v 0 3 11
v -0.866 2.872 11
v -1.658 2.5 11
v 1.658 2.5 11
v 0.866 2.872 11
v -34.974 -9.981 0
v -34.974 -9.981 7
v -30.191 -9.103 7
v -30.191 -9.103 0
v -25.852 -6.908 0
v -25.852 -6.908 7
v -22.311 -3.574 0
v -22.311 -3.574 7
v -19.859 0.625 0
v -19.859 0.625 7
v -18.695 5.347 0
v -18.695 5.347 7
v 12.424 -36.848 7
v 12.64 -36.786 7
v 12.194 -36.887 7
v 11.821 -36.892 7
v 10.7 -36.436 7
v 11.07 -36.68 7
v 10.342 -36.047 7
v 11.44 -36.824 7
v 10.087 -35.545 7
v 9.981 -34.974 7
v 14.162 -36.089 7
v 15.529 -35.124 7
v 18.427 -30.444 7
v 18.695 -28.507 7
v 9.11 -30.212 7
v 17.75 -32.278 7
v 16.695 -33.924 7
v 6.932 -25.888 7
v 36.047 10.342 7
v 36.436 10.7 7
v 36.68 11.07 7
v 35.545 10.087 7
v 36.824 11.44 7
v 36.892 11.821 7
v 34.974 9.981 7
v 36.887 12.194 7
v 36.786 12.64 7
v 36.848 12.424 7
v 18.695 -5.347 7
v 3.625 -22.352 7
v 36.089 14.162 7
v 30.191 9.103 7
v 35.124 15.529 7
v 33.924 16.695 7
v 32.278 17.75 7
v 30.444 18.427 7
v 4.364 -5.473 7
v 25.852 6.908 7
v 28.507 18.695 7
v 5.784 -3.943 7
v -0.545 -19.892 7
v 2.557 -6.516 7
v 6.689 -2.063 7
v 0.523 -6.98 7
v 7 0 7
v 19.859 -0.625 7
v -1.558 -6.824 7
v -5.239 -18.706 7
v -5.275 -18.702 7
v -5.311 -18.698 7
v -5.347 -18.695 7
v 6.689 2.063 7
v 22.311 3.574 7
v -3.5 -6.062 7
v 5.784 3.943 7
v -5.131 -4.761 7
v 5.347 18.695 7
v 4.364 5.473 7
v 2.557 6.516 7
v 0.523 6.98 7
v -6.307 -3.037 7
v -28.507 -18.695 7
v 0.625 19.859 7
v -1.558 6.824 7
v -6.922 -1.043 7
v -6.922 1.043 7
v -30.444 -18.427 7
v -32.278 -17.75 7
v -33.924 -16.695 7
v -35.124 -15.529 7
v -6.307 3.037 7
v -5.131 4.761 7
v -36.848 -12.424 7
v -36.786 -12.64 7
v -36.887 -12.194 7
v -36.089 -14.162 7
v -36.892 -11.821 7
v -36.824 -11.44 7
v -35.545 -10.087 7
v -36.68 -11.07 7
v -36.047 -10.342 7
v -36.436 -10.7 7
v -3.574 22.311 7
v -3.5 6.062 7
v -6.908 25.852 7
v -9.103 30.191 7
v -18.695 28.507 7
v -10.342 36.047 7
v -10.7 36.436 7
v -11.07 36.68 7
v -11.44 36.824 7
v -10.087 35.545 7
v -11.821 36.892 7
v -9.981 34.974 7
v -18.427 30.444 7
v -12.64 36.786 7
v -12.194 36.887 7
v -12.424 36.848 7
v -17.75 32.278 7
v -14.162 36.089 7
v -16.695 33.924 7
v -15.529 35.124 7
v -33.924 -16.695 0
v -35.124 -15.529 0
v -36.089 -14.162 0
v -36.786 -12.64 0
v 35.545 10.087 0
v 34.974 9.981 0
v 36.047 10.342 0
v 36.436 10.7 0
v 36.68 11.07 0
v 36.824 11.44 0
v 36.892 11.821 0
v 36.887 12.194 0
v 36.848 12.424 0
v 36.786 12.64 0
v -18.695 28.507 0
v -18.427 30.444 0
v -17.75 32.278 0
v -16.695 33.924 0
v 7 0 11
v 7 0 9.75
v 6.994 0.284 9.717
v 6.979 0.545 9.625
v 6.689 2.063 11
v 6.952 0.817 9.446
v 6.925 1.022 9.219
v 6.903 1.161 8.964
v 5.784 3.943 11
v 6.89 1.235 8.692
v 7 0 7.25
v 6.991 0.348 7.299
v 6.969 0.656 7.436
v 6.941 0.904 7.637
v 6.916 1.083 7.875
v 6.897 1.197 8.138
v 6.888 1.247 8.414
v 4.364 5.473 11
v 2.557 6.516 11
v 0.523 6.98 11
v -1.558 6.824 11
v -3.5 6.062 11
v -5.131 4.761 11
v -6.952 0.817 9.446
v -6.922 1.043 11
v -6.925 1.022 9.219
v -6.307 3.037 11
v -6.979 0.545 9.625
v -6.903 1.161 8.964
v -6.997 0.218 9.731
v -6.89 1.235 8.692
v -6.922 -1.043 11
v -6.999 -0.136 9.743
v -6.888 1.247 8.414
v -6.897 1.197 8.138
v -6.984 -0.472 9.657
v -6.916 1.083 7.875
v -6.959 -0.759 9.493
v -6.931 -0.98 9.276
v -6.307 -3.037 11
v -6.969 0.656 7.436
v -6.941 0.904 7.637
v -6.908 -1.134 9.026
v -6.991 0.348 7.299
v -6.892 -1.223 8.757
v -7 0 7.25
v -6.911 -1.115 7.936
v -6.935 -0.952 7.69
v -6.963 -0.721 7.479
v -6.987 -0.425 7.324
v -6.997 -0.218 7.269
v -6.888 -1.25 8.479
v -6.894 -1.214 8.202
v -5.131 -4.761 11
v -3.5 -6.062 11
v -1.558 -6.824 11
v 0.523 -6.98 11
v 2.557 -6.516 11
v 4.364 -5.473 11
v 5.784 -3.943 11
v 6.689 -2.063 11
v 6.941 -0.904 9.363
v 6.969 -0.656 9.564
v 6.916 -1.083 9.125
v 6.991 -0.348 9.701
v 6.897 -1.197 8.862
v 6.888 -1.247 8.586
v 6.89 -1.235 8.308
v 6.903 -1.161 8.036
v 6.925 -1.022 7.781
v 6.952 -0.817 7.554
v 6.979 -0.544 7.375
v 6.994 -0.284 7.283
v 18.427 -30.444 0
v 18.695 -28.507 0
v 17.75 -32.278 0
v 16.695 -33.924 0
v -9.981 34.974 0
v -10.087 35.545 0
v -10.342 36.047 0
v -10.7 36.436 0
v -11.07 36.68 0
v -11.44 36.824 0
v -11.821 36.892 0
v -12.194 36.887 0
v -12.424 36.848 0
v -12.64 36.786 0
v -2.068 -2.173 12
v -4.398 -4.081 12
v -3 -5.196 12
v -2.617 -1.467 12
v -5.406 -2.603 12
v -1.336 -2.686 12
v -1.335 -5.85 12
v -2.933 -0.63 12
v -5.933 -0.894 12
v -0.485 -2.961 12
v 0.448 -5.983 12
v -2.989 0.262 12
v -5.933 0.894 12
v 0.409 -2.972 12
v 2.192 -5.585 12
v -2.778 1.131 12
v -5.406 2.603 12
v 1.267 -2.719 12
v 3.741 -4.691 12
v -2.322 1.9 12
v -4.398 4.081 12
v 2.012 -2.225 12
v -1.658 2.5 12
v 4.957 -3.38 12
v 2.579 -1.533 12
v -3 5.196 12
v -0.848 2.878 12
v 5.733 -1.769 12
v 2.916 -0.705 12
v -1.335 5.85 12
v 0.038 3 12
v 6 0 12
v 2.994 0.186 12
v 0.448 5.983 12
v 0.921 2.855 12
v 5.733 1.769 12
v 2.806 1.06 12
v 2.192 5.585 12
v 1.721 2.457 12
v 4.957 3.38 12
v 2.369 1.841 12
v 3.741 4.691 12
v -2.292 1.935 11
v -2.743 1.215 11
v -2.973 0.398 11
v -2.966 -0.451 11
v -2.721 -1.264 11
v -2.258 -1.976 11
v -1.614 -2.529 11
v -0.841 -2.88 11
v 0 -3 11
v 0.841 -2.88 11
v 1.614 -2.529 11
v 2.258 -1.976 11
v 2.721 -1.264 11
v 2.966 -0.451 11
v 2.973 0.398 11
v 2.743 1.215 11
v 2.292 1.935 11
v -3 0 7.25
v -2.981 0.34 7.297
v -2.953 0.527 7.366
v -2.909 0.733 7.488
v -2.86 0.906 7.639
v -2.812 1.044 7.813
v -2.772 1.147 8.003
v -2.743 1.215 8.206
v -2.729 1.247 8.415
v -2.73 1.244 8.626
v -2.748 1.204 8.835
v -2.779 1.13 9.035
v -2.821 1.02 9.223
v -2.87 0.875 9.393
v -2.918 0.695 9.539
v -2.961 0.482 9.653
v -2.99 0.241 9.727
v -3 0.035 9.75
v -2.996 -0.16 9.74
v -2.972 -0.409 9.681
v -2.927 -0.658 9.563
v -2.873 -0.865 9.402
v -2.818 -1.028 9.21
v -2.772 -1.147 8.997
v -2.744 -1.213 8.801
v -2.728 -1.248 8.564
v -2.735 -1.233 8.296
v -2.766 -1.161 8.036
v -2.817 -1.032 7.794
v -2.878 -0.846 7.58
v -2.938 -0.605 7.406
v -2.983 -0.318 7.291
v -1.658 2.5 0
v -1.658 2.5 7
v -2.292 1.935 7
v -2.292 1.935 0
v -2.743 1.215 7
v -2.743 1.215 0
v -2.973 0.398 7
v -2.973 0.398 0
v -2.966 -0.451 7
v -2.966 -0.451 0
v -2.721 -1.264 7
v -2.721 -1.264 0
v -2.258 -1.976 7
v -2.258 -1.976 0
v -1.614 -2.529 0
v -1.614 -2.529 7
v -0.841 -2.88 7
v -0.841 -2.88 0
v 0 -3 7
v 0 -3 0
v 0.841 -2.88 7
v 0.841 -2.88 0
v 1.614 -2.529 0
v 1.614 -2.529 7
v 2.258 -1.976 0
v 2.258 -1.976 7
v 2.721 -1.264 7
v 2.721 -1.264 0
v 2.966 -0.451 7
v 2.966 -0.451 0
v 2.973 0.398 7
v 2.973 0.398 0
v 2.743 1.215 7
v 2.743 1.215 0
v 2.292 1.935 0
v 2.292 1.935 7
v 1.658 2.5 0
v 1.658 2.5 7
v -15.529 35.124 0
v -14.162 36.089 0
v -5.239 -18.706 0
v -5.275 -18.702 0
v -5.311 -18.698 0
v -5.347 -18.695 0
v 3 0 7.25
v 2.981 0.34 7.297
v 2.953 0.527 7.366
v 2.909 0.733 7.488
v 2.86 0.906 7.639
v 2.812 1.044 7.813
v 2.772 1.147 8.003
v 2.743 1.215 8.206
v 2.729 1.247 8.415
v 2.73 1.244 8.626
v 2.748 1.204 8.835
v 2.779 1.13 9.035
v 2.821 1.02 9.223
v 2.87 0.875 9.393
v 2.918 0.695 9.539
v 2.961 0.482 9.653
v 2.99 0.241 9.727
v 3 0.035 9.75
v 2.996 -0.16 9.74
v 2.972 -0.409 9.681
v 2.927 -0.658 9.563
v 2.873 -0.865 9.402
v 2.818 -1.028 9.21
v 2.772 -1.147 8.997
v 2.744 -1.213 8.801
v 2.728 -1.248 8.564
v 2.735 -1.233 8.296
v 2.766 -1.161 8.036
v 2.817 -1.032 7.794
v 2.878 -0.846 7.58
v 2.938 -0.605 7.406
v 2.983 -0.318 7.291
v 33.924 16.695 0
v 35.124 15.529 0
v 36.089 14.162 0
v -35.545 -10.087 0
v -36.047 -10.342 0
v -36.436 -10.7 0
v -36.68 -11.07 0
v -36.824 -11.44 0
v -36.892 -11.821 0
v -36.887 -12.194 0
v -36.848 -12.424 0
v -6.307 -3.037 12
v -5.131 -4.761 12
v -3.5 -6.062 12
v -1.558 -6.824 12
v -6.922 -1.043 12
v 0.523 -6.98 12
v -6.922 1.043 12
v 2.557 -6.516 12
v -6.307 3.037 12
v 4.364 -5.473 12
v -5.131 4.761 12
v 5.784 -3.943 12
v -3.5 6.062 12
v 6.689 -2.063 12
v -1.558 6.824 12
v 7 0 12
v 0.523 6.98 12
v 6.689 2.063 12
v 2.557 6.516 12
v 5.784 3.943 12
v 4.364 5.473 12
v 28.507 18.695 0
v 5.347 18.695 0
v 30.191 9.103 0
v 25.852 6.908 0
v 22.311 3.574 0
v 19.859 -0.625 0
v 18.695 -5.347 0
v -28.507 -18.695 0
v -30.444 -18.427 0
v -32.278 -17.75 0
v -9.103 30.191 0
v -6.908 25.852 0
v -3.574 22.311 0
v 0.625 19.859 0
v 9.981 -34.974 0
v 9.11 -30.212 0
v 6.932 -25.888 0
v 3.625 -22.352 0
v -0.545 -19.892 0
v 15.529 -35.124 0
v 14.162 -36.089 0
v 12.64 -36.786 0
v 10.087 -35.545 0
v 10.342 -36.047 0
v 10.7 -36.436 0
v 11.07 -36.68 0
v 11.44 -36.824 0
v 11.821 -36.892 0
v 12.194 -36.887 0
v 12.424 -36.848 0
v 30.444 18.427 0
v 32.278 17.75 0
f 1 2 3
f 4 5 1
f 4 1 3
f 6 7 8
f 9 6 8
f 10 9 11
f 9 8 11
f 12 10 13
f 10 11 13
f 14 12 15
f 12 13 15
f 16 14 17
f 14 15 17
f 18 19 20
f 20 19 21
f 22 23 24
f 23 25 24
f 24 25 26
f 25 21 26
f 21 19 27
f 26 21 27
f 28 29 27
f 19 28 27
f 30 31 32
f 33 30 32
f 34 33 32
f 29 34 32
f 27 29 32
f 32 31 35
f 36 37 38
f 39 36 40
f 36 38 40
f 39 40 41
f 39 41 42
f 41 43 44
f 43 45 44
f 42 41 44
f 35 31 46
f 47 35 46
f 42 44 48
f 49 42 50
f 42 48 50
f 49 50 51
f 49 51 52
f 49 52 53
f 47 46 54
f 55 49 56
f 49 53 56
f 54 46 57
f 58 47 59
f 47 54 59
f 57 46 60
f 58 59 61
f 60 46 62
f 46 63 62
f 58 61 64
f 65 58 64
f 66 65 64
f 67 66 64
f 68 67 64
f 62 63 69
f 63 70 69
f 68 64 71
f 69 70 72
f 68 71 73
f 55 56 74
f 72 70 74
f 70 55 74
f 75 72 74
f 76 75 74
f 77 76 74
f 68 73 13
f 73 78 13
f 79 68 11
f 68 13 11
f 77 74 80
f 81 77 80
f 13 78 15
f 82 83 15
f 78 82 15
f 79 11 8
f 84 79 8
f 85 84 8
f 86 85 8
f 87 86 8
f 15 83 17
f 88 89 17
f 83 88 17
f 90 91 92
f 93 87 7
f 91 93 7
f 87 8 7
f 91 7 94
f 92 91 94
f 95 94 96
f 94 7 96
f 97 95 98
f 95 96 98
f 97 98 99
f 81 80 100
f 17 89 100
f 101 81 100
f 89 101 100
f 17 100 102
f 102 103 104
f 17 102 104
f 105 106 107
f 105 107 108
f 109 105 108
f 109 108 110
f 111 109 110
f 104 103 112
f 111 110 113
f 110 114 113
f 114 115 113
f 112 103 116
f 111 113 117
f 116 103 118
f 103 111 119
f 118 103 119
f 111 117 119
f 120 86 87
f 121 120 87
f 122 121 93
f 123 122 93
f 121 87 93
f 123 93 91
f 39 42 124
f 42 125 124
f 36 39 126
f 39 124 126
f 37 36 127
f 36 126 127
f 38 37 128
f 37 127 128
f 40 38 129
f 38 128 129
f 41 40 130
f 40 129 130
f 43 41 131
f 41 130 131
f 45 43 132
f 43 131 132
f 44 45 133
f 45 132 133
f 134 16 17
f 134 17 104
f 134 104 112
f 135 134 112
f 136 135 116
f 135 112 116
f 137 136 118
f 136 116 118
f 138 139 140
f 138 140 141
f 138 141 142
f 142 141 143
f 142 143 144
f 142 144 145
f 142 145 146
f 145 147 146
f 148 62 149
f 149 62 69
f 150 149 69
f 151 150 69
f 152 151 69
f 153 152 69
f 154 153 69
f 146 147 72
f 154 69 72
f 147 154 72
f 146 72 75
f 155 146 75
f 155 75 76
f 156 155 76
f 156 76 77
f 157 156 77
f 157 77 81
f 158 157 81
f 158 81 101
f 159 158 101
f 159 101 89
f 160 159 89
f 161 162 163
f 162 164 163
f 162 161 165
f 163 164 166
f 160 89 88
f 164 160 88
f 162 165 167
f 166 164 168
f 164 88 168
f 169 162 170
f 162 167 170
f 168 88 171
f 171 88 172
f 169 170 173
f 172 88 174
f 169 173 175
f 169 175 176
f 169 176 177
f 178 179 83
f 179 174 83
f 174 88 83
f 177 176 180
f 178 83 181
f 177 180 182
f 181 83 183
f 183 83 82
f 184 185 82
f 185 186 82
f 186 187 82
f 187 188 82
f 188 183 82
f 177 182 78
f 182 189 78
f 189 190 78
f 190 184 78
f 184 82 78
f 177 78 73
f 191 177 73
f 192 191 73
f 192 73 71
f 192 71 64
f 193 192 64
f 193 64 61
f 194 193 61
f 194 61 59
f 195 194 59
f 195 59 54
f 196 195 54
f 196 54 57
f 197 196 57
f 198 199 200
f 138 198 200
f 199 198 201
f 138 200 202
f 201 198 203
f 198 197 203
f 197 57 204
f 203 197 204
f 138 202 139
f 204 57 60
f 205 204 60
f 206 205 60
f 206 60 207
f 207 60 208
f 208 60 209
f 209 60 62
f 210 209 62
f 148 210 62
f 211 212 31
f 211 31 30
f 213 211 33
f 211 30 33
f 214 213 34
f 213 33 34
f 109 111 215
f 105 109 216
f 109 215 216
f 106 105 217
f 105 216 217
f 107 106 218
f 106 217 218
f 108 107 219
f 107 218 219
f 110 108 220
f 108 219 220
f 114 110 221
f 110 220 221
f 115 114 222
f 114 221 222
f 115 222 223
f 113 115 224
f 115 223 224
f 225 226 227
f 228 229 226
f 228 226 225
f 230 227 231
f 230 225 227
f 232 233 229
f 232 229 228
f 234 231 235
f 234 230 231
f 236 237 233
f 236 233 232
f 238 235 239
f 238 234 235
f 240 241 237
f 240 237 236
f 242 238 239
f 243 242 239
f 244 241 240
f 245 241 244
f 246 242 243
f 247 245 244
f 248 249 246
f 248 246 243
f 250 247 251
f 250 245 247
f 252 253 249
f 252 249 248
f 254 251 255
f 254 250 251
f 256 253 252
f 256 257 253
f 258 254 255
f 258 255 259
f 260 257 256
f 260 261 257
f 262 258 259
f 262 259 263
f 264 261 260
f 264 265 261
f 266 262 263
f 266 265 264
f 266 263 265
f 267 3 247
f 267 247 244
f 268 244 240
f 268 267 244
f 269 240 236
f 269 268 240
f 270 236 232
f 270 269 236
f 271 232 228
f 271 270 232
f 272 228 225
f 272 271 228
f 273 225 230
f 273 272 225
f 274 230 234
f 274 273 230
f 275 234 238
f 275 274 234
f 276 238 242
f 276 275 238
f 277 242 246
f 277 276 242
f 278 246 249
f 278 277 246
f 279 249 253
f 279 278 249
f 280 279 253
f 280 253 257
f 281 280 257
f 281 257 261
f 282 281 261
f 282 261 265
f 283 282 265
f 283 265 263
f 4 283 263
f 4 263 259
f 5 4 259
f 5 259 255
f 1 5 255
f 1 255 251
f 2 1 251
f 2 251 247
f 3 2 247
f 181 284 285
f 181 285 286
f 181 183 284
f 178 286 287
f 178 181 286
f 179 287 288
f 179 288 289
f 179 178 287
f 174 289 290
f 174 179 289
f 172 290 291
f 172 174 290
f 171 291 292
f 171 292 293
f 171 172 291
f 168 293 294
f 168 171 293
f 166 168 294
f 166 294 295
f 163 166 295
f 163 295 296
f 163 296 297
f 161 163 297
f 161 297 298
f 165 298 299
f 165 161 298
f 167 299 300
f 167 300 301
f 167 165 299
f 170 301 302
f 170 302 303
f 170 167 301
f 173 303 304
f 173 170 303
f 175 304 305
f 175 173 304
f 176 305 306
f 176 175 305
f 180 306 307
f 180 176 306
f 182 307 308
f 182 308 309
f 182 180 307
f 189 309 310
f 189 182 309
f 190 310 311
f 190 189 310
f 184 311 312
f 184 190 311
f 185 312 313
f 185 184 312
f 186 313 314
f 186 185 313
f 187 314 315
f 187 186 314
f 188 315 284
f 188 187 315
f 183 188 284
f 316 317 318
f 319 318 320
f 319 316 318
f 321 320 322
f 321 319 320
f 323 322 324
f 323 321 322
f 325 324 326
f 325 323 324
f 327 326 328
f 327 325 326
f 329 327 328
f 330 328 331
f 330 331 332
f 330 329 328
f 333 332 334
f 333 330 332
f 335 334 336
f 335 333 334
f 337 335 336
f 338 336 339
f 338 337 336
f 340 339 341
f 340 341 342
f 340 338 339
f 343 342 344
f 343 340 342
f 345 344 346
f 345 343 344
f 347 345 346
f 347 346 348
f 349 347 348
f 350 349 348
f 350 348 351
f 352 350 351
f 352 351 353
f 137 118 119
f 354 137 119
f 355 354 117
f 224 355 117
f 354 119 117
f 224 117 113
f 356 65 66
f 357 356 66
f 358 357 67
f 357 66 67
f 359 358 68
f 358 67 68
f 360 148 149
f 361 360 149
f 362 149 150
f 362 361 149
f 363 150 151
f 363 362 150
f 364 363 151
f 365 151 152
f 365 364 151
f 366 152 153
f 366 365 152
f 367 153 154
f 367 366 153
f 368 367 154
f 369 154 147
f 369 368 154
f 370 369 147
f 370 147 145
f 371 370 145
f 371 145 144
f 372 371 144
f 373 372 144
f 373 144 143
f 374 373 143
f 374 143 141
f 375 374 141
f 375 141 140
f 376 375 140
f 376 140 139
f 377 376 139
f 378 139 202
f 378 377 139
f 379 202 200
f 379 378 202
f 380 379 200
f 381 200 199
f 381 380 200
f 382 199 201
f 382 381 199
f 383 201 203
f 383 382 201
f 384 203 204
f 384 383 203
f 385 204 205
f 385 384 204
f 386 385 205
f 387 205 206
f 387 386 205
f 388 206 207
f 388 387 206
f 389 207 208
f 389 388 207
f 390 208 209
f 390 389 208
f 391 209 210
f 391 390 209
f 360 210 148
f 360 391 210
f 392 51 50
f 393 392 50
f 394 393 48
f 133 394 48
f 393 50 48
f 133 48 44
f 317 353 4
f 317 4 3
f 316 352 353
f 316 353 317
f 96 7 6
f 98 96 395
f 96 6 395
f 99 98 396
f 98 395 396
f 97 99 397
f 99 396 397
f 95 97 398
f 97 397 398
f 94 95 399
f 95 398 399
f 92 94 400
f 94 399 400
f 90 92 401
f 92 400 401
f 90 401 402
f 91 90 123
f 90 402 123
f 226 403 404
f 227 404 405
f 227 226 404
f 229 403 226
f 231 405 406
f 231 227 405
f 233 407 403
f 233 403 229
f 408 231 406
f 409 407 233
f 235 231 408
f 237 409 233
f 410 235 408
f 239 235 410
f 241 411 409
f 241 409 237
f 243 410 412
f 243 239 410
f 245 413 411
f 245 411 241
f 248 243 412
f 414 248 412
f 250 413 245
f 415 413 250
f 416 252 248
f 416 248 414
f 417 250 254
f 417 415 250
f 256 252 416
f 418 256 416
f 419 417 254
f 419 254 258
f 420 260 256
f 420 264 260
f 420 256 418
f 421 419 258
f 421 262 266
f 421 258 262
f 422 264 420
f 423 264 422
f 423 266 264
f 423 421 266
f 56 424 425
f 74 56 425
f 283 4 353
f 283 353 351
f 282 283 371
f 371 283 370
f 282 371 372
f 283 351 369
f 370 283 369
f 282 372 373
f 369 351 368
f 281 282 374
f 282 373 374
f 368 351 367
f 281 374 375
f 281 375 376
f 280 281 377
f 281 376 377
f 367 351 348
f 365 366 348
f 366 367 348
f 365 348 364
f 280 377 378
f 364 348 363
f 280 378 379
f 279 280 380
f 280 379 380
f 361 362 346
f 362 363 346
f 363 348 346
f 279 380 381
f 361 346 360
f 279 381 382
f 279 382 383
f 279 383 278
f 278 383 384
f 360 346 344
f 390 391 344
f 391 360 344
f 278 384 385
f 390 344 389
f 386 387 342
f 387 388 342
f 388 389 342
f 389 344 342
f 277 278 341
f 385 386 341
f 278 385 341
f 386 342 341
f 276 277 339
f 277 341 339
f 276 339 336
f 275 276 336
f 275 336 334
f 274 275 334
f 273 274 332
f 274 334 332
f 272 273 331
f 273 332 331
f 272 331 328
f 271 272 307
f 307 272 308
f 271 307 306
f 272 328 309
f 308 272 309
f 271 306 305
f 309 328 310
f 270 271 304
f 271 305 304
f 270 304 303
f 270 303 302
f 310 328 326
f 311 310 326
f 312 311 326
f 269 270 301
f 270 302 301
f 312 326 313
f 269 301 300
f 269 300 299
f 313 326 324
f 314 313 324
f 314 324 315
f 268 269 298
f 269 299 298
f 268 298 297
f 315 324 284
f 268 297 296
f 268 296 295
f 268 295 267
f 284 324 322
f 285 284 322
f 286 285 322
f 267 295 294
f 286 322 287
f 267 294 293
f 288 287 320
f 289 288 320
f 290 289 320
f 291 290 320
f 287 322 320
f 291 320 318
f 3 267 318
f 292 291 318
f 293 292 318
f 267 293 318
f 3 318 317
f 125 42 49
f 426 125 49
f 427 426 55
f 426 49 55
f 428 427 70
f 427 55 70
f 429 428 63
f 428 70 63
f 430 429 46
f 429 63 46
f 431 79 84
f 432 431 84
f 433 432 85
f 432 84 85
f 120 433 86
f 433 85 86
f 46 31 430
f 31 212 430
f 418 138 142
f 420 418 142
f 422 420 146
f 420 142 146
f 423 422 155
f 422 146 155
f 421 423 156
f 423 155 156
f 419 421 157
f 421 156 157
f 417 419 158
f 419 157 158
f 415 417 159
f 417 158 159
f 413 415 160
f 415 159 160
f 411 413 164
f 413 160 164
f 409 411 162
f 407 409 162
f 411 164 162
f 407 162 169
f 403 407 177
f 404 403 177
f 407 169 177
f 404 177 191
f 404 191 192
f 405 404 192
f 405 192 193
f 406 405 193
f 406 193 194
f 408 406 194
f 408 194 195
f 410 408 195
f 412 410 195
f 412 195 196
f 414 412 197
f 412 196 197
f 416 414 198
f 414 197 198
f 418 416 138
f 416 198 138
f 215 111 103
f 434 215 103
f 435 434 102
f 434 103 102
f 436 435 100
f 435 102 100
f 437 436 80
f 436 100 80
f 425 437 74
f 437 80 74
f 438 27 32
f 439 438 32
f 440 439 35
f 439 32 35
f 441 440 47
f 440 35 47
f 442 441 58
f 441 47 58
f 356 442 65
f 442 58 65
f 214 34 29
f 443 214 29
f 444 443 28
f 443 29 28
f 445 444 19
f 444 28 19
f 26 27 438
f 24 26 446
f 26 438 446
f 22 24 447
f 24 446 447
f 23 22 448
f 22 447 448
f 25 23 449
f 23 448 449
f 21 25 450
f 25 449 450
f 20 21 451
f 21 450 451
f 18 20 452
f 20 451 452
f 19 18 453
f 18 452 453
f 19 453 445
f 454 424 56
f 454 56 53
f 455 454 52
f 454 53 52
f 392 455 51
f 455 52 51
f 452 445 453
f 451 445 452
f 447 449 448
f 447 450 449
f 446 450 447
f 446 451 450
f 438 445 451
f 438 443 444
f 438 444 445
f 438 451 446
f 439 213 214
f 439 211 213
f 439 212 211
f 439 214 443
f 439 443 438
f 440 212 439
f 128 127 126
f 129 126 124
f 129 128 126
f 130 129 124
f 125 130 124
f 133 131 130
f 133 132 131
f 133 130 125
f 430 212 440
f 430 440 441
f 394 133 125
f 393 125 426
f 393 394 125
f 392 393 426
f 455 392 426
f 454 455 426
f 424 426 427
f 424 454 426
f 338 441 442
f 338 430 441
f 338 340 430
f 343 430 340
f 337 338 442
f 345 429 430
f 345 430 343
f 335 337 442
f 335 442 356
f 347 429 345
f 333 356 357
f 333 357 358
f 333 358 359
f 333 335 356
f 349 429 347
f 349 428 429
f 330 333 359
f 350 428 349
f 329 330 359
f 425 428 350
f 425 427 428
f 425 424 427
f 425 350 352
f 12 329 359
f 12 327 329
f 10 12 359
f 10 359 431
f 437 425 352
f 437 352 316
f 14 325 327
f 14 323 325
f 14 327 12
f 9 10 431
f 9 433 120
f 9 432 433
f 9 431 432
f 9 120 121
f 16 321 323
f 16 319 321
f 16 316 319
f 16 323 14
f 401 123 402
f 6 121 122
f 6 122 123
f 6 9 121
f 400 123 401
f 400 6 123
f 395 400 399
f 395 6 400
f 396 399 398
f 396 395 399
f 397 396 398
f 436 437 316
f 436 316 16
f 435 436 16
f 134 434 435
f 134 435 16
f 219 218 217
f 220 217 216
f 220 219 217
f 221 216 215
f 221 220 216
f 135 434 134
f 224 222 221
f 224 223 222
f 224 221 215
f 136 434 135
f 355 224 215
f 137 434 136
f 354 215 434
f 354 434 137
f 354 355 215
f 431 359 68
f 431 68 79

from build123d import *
from build123d.topology import SkipClean

# Parameters (mm, degrees)
SKETCH_1_R               = 3
EXTRUDE_1_DEPTH          = 7
SKETCH_5_R               = 7
EXTRUDE_2_DEPTH          = 4
EXTRUDE_START            = 7
EXTRUDE_3_DEPTH          = 7
CUT_EXTRUDE_5_DEPTH      = 8
CUT_EXTRUDE_5_DEPTH_BACK = 15
SKETCH_12_R              = 6
SKETCH_12_R_2            = 3
EXTRUDE_4_DEPTH          = 1
SKETCH_13_R              = 82.694540834
CUT_EXTRUDE_13_DEPTH     = 10
FILLET_1_R               = 2
FILLET_2_R               = 2
EXTRUDE_5_DEPTH          = 7
CUT_EXTRUDE_14_DEPTH     = 10
FILLET_3_R               = 3
FILLET_4_R               = 1
EXTRUDE_START_2          = -7
EXTRUDE_6_DEPTH          = 7
SKETCH_18_R              = 47.238796546
CUT_EXTRUDE_15_DEPTH     = 10
FILLET_5_R               = 2
SKETCH_22_R              = 7
SKETCH_22_R_2            = 6
EXTRUDE_8_DEPTH          = 1


with BuildPart() as part:
    # 草图1 → 凸台-拉伸1 (new body)
    with BuildSketch(Plane.XY):
        with BuildLine():
            ThreePointArc((32.8, 22.894540834), (36.610888994, 26.155959788), (40.879786515, 28.789634497))
            ThreePointArc((40.879786515, 28.789634497), (35.355339059, 35.355339059), (28.789634497, 40.879786515))
            ThreePointArc((28.789634497, 40.879786515), (26.155959788, 36.610888994), (22.894540834, 32.8))
            ThreePointArc((22.894540834, 32.8), (0, 23.316770682), (-22.894540834, 32.8))
            ThreePointArc((-22.894540834, 32.8), (-26.155959788, 36.610888994), (-28.789634497, 40.879786515))
            ThreePointArc((-28.789634497, 40.879786515), (-35.355339059, 35.355339059), (-40.879786515, 28.789634497))
            ThreePointArc((-40.879786515, 28.789634497), (-36.610888994, 26.155959788), (-32.8, 22.894540834))
            ThreePointArc((-32.8, 22.894540834), (-23.316770682, 0), (-32.8, -22.894540834))
            ThreePointArc((-32.8, -22.894540834), (-36.610888994, -26.155959788), (-40.879786515, -28.789634497))
            ThreePointArc((-40.879786515, -28.789634497), (-35.355339059, -35.355339059), (-28.789634497, -40.879786515))
            ThreePointArc((-28.789634497, -40.879786515), (-26.155959788, -36.610888994), (-22.894540834, -32.8))
            ThreePointArc((-22.894540834, -32.8), (0, -23.316770682), (22.894540834, -32.8))
            ThreePointArc((22.894540834, -32.8), (26.155959788, -36.610888994), (28.789634497, -40.879786515))
            ThreePointArc((28.789634497, -40.879786515), (35.355339059, -35.355339059), (40.879786515, -28.789634497))
            ThreePointArc((40.879786515, -28.789634497), (36.610888994, -26.155959788), (32.8, -22.894540834))
            ThreePointArc((32.8, -22.894540834), (23.316770682, 0), (32.8, 22.894540834))
        make_face()
        Circle(SKETCH_1_R, mode=Mode.SUBTRACT)
    extrude(amount=EXTRUDE_1_DEPTH)

    # 草图5 → 凸台-拉伸2 (add)
    with BuildSketch(Plane.XY.offset(7)):
        Circle(SKETCH_5_R)
        with BuildLine():
            Line((-1.658312395, 2.5), (1.658312395, 2.5))
            ThreePointArc((1.658312395, 2.5), (0, -3), (-1.658312395, 2.5))
        make_face(mode=Mode.SUBTRACT)
    extrude(amount=EXTRUDE_2_DEPTH)

    # 草图10 → 凸台-拉伸3 (add)
    with BuildSketch(Plane(origin=(0, 0, 7), x_dir=(-1, 0, 0), z_dir=(0, 0, -1)).offset(EXTRUDE_START)):
        with BuildLine():
            Line((-1.658312395, 2.5), (1.658312395, 2.5))
            ThreePointArc((1.658312395, 2.5), (0, 3), (-1.658312395, 2.5))
        make_face()
    extrude(amount=-EXTRUDE_3_DEPTH)

    # 草图11 → 切除-拉伸5 (cut, two sides: drawn at the far end of the back side and taken through both)
    with BuildSketch(Plane(origin=(0, 0, 0), x_dir=(0, 0, -1), z_dir=(1, 0, 0)).offset(-CUT_EXTRUDE_5_DEPTH_BACK)):
        with BuildLine():
            ThreePointArc((-9.75, 0), (-8.5, -1.25), (-7.25, 0))
            Line((-7.25, 0), (-9.75, 0))
        make_face()
        with BuildLine():
            Line((-9.75, 0), (-7.25, 0))
            ThreePointArc((-7.25, 0), (-8.5, 1.25), (-9.75, 0))
        make_face()
    extrude(amount=CUT_EXTRUDE_5_DEPTH + CUT_EXTRUDE_5_DEPTH_BACK, mode=Mode.SUBTRACT)

    # 草图12 → 凸台-拉伸4 (add)
    with BuildSketch(Plane.XY.offset(11)):
        Circle(SKETCH_12_R)
        with Locations(Location((0, 0, 0), (0, 0, 123.557309762))):
            Circle(SKETCH_12_R_2, mode=Mode.SUBTRACT)
    extrude(amount=EXTRUDE_4_DEPTH)

    # 草图13 → 切除-拉伸13 (cut)
    with BuildSketch(Plane(origin=(0, 0, 0), x_dir=(-1, 0, 0), z_dir=(0, 0, -1))):
        Circle(SKETCH_13_R)
        with BuildLine():
            ThreePointArc((-25.243635923, 31.028355505), (0, 18.694540834), (25.243635923, 31.028355505))
            ThreePointArc((25.243635923, 31.028355505), (28.284271247, 28.284271247), (31.028355505, 25.243635923))
            ThreePointArc((31.028355505, 25.243635923), (18.694540834, 0), (31.028355505, -25.243635923))
            ThreePointArc((31.028355505, -25.243635923), (28.284271247, -28.284271247), (25.243635923, -31.028355505))
            ThreePointArc((25.243635923, -31.028355505), (0, -18.694540834), (-25.243635923, -31.028355505))
            ThreePointArc((-25.243635923, -31.028355505), (-28.284271247, -28.284271247), (-31.028355505, -25.243635923))
            ThreePointArc((-31.028355505, -25.243635923), (-18.694540834, 0), (-31.028355505, 25.243635923))
            ThreePointArc((-31.028355505, 25.243635923), (-28.284271247, 28.284271247), (-25.243635923, 31.028355505))
        make_face(mode=Mode.SUBTRACT)
    extrude(amount=-CUT_EXTRUDE_13_DEPTH, mode=Mode.SUBTRACT)

    # 圆角1
    fillet_1_edges = [part.edges().sort_by_distance(p)[0] for p in [
        (25.243635923, 31.028355505, 3.5),
        (-31.028355505, 25.243635923, 3.5),
        (-31.028355505, -25.243635923, 3.5),
        (31.028355505, -25.243635923, 3.5),
    ]]
    fillet(fillet_1_edges, radius=FILLET_1_R)

    # 圆角2
    fillet_2_edges = [part.edges().sort_by_distance(p)[0] for p in [
        (-25.243635923, 31.028355505, 3.5),
        (-25.243635923, -31.028355505, 3.5),
        (25.243635923, -31.028355505, 3.5),
        (31.028355505, 25.243635923, 3.5),
    ]]
    fillet(fillet_2_edges, radius=FILLET_2_R)

    # 草图14 → 凸台-拉伸5 (add)
    # profile 1 of 5: a face of its own
    with SkipClean():  # the faces are left unmerged after this step: merging them gives an invalid solid
        with BuildSketch(Plane(origin=(0, 0, 0), x_dir=(-1, 0, 0), z_dir=(0, 0, -1))):
            with BuildLine():
                ThreePointArc((18.694540834, 24.723130726), (9.821274778, 20.238957409), (0, 18.694540834))
                Line((0, 18.694540834), (-24.723130726, 18.694540834))
                ThreePointArc((-24.723130726, 18.694540834), (-20.238957409, 9.821274778), (-18.694540834, 0))
                Line((-18.694540834, 0), (-18.694540834, -24.723130726))
                ThreePointArc((-18.694540834, -24.723130726), (-9.821274778, -20.238957409), (0, -18.694540834))
                Line((0, -18.694540834), (24.723130726, -18.694540834))
                ThreePointArc((24.723130726, -18.694540834), (20.238957409, -9.821274778), (18.694540834, 0))
                Line((18.694540834, 0), (18.694540834, 24.723130726))
            make_face()
            with BuildLine():
                Line((-1.658312395, 2.5), (1.658312395, 2.5))
                ThreePointArc((1.658312395, 2.5), (0, -3), (-1.658312395, 2.5))
            make_face(mode=Mode.SUBTRACT)
        # profile 2 of 5: a face of its own
        with BuildSketch(Plane(origin=(0, 0, 0), x_dir=(-1, 0, 0), z_dir=(0, 0, -1))):
            with BuildLine():
                ThreePointArc((-18.694540834, 0), (-20.238957409, 9.821274778), (-24.723130726, 18.694540834))
                Line((-24.723130726, 18.694540834), (-34.095635208, 18.694540834))
                Line((-34.095635208, 18.694540834), (-34.095635208, 16.908162968))
                Line((-34.095635208, 16.908162968), (-34.095635208, 13.801737807))
                ThreePointArc((-34.095635208, 13.801737807), (-23.536654529, 10.090539986), (-18.694540834, 0))
            make_face()
        # profile 3 of 5: a face of its own
        with BuildSketch(Plane(origin=(0, 0, 0), x_dir=(-1, 0, 0), z_dir=(0, 0, -1))):
            with BuildLine():
                ThreePointArc((13.801737807, 34.095635208), (10.090539986, 23.536654529), (0, 18.694540834))
                ThreePointArc((0, 18.694540834), (9.821274778, 20.238957409), (18.694540834, 24.723130726))
                Line((18.694540834, 24.723130726), (18.694540834, 34.095635208))
                Line((18.694540834, 34.095635208), (16.908162968, 34.095635208))
                Line((16.908162968, 34.095635208), (13.801737807, 34.095635208))
            make_face()
        # profile 4 of 5: a face of its own
        with BuildSketch(Plane(origin=(0, 0, 0), x_dir=(-1, 0, 0), z_dir=(0, 0, -1))):
            with BuildLine():
                ThreePointArc((34.095635208, -13.801737807), (23.536654529, -10.090539986), (18.694540834, 0))
                ThreePointArc((18.694540834, 0), (20.238957409, -9.821274778), (24.723130726, -18.694540834))
                Line((24.723130726, -18.694540834), (34.095635208, -18.694540834))
                Line((34.095635208, -18.694540834), (34.095635208, -16.908162968))
                Line((34.095635208, -16.908162968), (34.095635208, -13.801737807))
            make_face()
        # profile 5 of 5: a face of its own
        with BuildSketch(Plane(origin=(0, 0, 0), x_dir=(-1, 0, 0), z_dir=(0, 0, -1))):
            with BuildLine():
                ThreePointArc((0, -18.694540834), (-9.821274778, -20.238957409), (-18.694540834, -24.723130726))
                Line((-18.694540834, -24.723130726), (-18.694540834, -34.095635208))
                Line((-18.694540834, -34.095635208), (-16.908162968, -34.095635208))
                Line((-16.908162968, -34.095635208), (-13.801737807, -34.095635208))
                ThreePointArc((-13.801737807, -34.095635208), (-10.090539986, -23.536654529), (0, -18.694540834))
            make_face()
        extrude(amount=-EXTRUDE_5_DEPTH)

    # 草图15 → 切除-拉伸14 (cut)
    with SkipClean():  # the faces are left unmerged after this step: merging them gives an invalid solid
        with BuildSketch(Plane(origin=(0, 0, 0), x_dir=(-1, 0, 0), z_dir=(0, 0, -1))):
            with BuildLine():
                Line((-24.723130726, 18.694540834), (-33.334723843, 25.692106251))
                Line((-33.334723843, 25.692106251), (-12.530174443, 42.497606237))
                Line((-12.530174443, 42.497606237), (0, 18.694540834))
                ThreePointArc((0, 18.694540834), (-13.155803158, 21.523924741), (-23.985180208, 29.51173813))
                ThreePointArc((-23.985180208, 29.51173813), (-25.372019669, 30.184661343), (-26.825530496, 29.671382064))
                ThreePointArc((-26.825530496, 29.671382064), (-28.284271247, 28.284271247), (-29.671382064, 26.825530496))
                ThreePointArc((-29.671382064, 26.825530496), (-30.184661343, 25.372019669), (-29.51173813, 23.985180208))
                ThreePointArc((-29.51173813, 23.985180208), (-26.969497889, 21.473759272), (-24.723130726, 18.694540834))
            make_face()
            with BuildLine():
                Line((-24.723130726, 18.694540834), (0, 18.694540834))
                ThreePointArc((0, 18.694540834), (-13.155803158, 21.523924741), (-23.985180208, 29.51173813))
                ThreePointArc((-23.985180208, 29.51173813), (-25.372019669, 30.184661343), (-26.825530496, 29.671382064))
                ThreePointArc((-26.825530496, 29.671382064), (-28.284271247, 28.284271247), (-29.671382064, 26.825530496))
                ThreePointArc((-29.671382064, 26.825530496), (-30.184661343, 25.372019669), (-29.51173813, 23.985180208))
                ThreePointArc((-29.51173813, 23.985180208), (-26.969497889, 21.473759272), (-24.723130726, 18.694540834))
            make_face()
            with BuildLine():
                Line((18.694540834, 0), (18.694540834, 24.723130726))
                ThreePointArc((18.694540834, 24.723130726), (21.473759272, 26.969497889), (23.985180208, 29.51173813))
                ThreePointArc((23.985180208, 29.51173813), (25.372019669, 30.184661343), (26.825530496, 29.671382064))
                ThreePointArc((26.825530496, 29.671382064), (28.284271247, 28.284271247), (29.671382064, 26.825530496))
                ThreePointArc((29.671382064, 26.825530496), (30.184661343, 25.372019669), (29.51173813, 23.985180208))
                ThreePointArc((29.51173813, 23.985180208), (21.523924741, 13.155803158), (18.694540834, 0))
            make_face()
            with BuildLine():
                Line((18.694540834, 24.723130726), (25.692106251, 33.334723843))
                Line((25.692106251, 33.334723843), (42.497606237, 12.530174443))
                Line((42.497606237, 12.530174443), (18.694540834, 0))
                ThreePointArc((18.694540834, 0), (21.523924741, 13.155803158), (29.51173813, 23.985180208))
                ThreePointArc((29.51173813, 23.985180208), (30.184661343, 25.372019669), (29.671382064, 26.825530496))
                ThreePointArc((29.671382064, 26.825530496), (28.284271247, 28.284271247), (26.825530496, 29.671382064))
                ThreePointArc((26.825530496, 29.671382064), (25.372019669, 30.184661343), (23.985180208, 29.51173813))
                ThreePointArc((23.985180208, 29.51173813), (21.473759272, 26.969497889), (18.694540834, 24.723130726))
            make_face()
            with BuildLine():
                ThreePointArc((29.51173813, -23.985180208), (26.969497889, -21.473759272), (24.723130726, -18.694540834))
                Line((24.723130726, -18.694540834), (0.927061706, -18.707972456))
                ThreePointArc((0.927061706, -18.707972456), (13.577013202, -21.717572178), (23.985180208, -29.51173813))
                ThreePointArc((23.985180208, -29.51173813), (25.372019669, -30.184661343), (26.825530496, -29.671382064))
                ThreePointArc((26.825530496, -29.671382064), (28.284271247, -28.284271247), (29.671382064, -26.825530496))
                ThreePointArc((29.671382064, -26.825530496), (30.184661343, -25.372019669), (29.51173813, -23.985180208))
            make_face()
            with BuildLine():
                Line((24.723130726, -18.694540834), (33.334723843, -25.692106251))
                Line((33.334723843, -25.692106251), (12.530174443, -42.497606237))
                Line((12.530174443, -42.497606237), (0, -18.694540834))
                ThreePointArc((0, -18.694540834), (13.155803158, -21.523924741), (23.985180208, -29.51173813))
                ThreePointArc((23.985180208, -29.51173813), (25.372019669, -30.184661343), (26.825530496, -29.671382064))
                ThreePointArc((26.825530496, -29.671382064), (28.284271247, -28.284271247), (29.671382064, -26.825530496))
                ThreePointArc((29.671382064, -26.825530496), (30.184661343, -25.372019669), (29.51173813, -23.985180208))
                ThreePointArc((29.51173813, -23.985180208), (26.969497889, -21.473759272), (24.723130726, -18.694540834))
            make_face()
            with BuildLine():
                Line((-42.497606237, -12.530174443), (-18.694540834, 0))
                ThreePointArc((-18.694540834, 0), (-21.523924741, -13.155803158), (-29.51173813, -23.985180208))
                ThreePointArc((-29.51173813, -23.985180208), (-30.184661343, -25.372019669), (-29.671382064, -26.825530496))
                ThreePointArc((-29.671382064, -26.825530496), (-28.284271247, -28.284271247), (-26.825530496, -29.671382064))
                ThreePointArc((-26.825530496, -29.671382064), (-25.372019669, -30.184661343), (-23.985180208, -29.51173813))
                ThreePointArc((-23.985180208, -29.51173813), (-21.473759272, -26.969497889), (-18.694540834, -24.723130726))
                Line((-18.694540834, -24.723130726), (-25.692106251, -33.334723843))
                Line((-25.692106251, -33.334723843), (-42.497606237, -12.530174443))
            make_face()
            with BuildLine():
                Line((-18.694540834, -24.723130726), (-18.694540834, 0))
                ThreePointArc((-18.694540834, 0), (-21.523924741, -13.155803158), (-29.51173813, -23.985180208))
                ThreePointArc((-29.51173813, -23.985180208), (-30.184661343, -25.372019669), (-29.671382064, -26.825530496))
                ThreePointArc((-29.671382064, -26.825530496), (-28.284271247, -28.284271247), (-26.825530496, -29.671382064))
                ThreePointArc((-26.825530496, -29.671382064), (-25.372019669, -30.184661343), (-23.985180208, -29.51173813))
                ThreePointArc((-23.985180208, -29.51173813), (-21.473759272, -26.969497889), (-18.694540834, -24.723130726))
            make_face()
        extrude(amount=-CUT_EXTRUDE_14_DEPTH, mode=Mode.SUBTRACT)

    # 圆角3
    fillet_3_edges = [part.edges().sort_by_distance(p)[0] for p in [
        (34.095635208, 18.694540834, 3.5),
        (-18.694540834, 34.095635208, 3.5),
        (-34.095635208, -18.694540834, 3.5),
        (18.694540834, -34.095635208, 3.5),
    ]]
    fillet(fillet_3_edges, radius=FILLET_3_R)

    # 圆角4
    fillet_4_edges = [part.edges().sort_by_distance(p)[0] for p in [
        (-13.801737807, 34.095635208, 3.5),
        (-34.095635208, -13.801737807, 3.5),
        (13.801737807, -34.095635208, 3.5),
        (34.095635208, 13.801737807, 3.5),
    ]]
    fillet(fillet_4_edges, radius=FILLET_4_R)

    # 草图16 → 凸台-拉伸6 (add)
    with SkipClean():  # the faces are left unmerged after this step: merging them gives an invalid solid
        with BuildSketch(Plane(origin=(0, 0, 0), x_dir=(-1, 0, 0), z_dir=(0, 0, -1)).offset(EXTRUDE_START_2)):
            with BuildLine():
                ThreePointArc((9.910873566, 37.290487321), (6.133427391, 24.832564637), (-5.346712023, 18.694540834))
                Line((-5.346712023, 18.694540834), (0, 18.694540834))
                ThreePointArc((0, 18.694540834), (9.754847949, 23.174553207), (13.822417362, 33.108457194))
                ThreePointArc((13.822417362, 33.108457194), (14.119776258, 33.807260807), (14.822335157, 34.095635208))
                Line((14.822335157, 34.095635208), (15.694540834, 34.095635208))
                ThreePointArc((15.694540834, 34.095635208), (16.201960761, 34.052411326), (16.694758916, 33.923985219))
                ThreePointArc((16.694758916, 33.923985219), (13.671949052, 36.351080947), (9.910873566, 37.290487321))
            make_face()
            with BuildLine():
                ThreePointArc((-37.290487321, 9.910873566), (-24.832564637, 6.133427391), (-18.694540834, -5.346712023))
                Line((-18.694540834, -5.346712023), (-18.694540834, 0))
                ThreePointArc((-18.694540834, 0), (-23.174553207, 9.754847949), (-33.108457194, 13.822417362))
                ThreePointArc((-33.108457194, 13.822417362), (-33.807260807, 14.119776258), (-34.095635208, 14.822335157))
                Line((-34.095635208, 14.822335157), (-34.095635208, 15.694540834))
                ThreePointArc((-34.095635208, 15.694540834), (-34.052411326, 16.201960761), (-33.923985219, 16.694758916))
                ThreePointArc((-33.923985219, 16.694758916), (-36.351080947, 13.671949052), (-37.290487321, 9.910873566))
            make_face()
            with BuildLine():
                ThreePointArc((-9.910873566, -37.290487321), (-6.167788996, -24.874581099), (5.238714674, -18.705538756))
                Line((5.238714674, -18.705538756), (0.927061706, -18.707972456))
                ThreePointArc((0.927061706, -18.707972456), (0.463579501, -18.697898916), (0, -18.694540834))
                ThreePointArc((0, -18.694540834), (-9.754847949, -23.174553207), (-13.822417362, -33.108457194))
                ThreePointArc((-13.822417362, -33.108457194), (-14.119776258, -33.807260807), (-14.822335157, -34.095635208))
                Line((-14.822335157, -34.095635208), (-15.694540834, -34.095635208))
                ThreePointArc((-15.694540834, -34.095635208), (-16.201960761, -34.052411326), (-16.694758916, -33.923985219))
                ThreePointArc((-16.694758916, -33.923985219), (-13.671949052, -36.351080947), (-9.910873566, -37.290487321))
            make_face()
            with BuildLine():
                ThreePointArc((37.290487321, -9.910873566), (24.832564637, -6.133427391), (18.694540834, 5.346712023))
                Line((18.694540834, 5.346712023), (18.694540834, 0))
                ThreePointArc((18.694540834, 0), (23.174553207, -9.754847949), (33.108457194, -13.822417362))
                ThreePointArc((33.108457194, -13.822417362), (33.807260807, -14.119776258), (34.095635208, -14.822335157))
                Line((34.095635208, -14.822335157), (34.095635208, -15.694540834))
                ThreePointArc((34.095635208, -15.694540834), (34.052411326, -16.201960761), (33.923985219, -16.694758916))
                ThreePointArc((33.923985219, -16.694758916), (36.351080947, -13.671949052), (37.290487321, -9.910873566))
            make_face()
        extrude(amount=EXTRUDE_6_DEPTH)

    # 草图18 → 切除-拉伸15 (cut)
    with SkipClean():  # the faces are left unmerged after this step: merging them gives an invalid solid
        with BuildSketch(Plane.XY.offset(7)):
            Circle(SKETCH_18_R)
            with BuildLine():
                Line((5.346712023, 18.694540834), (27.984188654, 18.694540834))
                ThreePointArc((27.984188654, 18.694540834), (34.456495042, 16.230104762), (37.290487321, 9.910873566))
                ThreePointArc((37.290487321, 9.910873566), (24.832564637, 6.133427391), (18.694540834, -5.346712023))
                Line((18.694540834, -5.346712023), (18.694540834, -27.984188654))
                ThreePointArc((18.694540834, -27.984188654), (16.230104762, -34.456495042), (9.910873566, -37.290487321))
                ThreePointArc((9.910873566, -37.290487321), (6.133427391, -24.832564637), (-5.346712023, -18.694540834))
                Line((-5.346712023, -18.694540834), (-27.984188654, -18.694540834))
                ThreePointArc((-27.984188654, -18.694540834), (-34.456495042, -16.230104762), (-37.290487321, -9.910873566))
                ThreePointArc((-37.290487321, -9.910873566), (-24.832564637, -6.133427391), (-18.694540834, 5.346712023))
                Line((-18.694540834, 5.346712023), (-18.694540834, 27.984188654))
                ThreePointArc((-18.694540834, 27.984188654), (-16.230104762, 34.456495042), (-9.910873566, 37.290487321))
                ThreePointArc((-9.910873566, 37.290487321), (-6.133427391, 24.832564637), (5.346712023, 18.694540834))
            make_face(mode=Mode.SUBTRACT)
        extrude(amount=-CUT_EXTRUDE_15_DEPTH, mode=Mode.SUBTRACT)

    # 圆角5
    fillet_5_edges = [part.edges().sort_by_distance(p)[0] for p in [
        (-9.910873566, 37.290487321, 3.5),
        (37.290487321, 9.910873566, 3.5),
        (9.910873566, -37.290487321, 3.5),
        (-37.290487321, -9.910873566, 3.5),
    ]]
    fillet(fillet_5_edges, radius=FILLET_5_R)

    # 草图22 → 凸台-拉伸8 (add)
    with SkipClean():  # the faces are left unmerged after this step: merging them gives an invalid solid
        with BuildSketch(Plane.XY.offset(11)):
            Circle(SKETCH_22_R)
            Circle(SKETCH_22_R_2, mode=Mode.SUBTRACT)
        extrude(amount=EXTRUDE_8_DEPTH)


solid = part.part
